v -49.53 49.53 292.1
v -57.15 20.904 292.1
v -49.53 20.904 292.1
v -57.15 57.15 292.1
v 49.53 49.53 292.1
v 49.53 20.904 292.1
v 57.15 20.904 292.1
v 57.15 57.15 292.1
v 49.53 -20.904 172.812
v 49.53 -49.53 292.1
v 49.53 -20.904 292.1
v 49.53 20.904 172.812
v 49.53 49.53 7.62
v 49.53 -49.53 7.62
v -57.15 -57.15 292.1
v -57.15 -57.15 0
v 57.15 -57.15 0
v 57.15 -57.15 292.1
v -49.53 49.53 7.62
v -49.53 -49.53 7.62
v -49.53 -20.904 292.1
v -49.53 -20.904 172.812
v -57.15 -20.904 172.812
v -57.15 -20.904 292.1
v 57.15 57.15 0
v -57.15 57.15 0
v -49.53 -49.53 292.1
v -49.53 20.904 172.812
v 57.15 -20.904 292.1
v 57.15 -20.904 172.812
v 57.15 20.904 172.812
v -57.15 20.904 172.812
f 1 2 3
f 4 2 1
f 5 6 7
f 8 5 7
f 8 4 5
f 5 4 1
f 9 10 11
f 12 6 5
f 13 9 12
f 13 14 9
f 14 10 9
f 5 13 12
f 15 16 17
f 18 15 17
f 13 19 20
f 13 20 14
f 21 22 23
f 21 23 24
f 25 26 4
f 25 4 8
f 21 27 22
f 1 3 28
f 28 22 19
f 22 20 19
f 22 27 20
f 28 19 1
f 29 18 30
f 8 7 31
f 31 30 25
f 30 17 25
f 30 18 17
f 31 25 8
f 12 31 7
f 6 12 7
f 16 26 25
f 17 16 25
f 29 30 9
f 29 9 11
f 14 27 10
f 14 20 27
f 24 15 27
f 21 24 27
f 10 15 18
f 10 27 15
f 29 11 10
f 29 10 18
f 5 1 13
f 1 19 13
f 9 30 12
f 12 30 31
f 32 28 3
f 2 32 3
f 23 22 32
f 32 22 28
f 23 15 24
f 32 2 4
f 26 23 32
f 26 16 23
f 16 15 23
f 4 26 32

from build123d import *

# Parameters (mm, degrees)
F0_W     = 114.3
F0_H     = 114.3
F1_DEPTH = 292.1
F2_T     = -7.62
F3_W     = 41.80703
F3_H     = 120.581752
F4_DEPTH = 70.104


with BuildPart() as f1:
    # F0 (on Top) → F1 (new body)
    with BuildSketch(Plane.XY):
        Rectangle(F0_W, F0_H)
    extrude(amount=F1_DEPTH)

    # F2
    f2_openings = [f1.faces().sort_by_distance(p)[0] for p in [
        (0, 0, 292.1),
    ]]
    offset(amount=F2_T, openings=f2_openings)

    # F3 (on Right) → F4 (cut, symmetric)
    with BuildSketch(Plane.YZ):
        with Locations((0, 233.103248)):
            Rectangle(F3_W, F3_H)
    extrude(amount=F4_DEPTH, both=True, mode=Mode.SUBTRACT)


solid = f1.part
